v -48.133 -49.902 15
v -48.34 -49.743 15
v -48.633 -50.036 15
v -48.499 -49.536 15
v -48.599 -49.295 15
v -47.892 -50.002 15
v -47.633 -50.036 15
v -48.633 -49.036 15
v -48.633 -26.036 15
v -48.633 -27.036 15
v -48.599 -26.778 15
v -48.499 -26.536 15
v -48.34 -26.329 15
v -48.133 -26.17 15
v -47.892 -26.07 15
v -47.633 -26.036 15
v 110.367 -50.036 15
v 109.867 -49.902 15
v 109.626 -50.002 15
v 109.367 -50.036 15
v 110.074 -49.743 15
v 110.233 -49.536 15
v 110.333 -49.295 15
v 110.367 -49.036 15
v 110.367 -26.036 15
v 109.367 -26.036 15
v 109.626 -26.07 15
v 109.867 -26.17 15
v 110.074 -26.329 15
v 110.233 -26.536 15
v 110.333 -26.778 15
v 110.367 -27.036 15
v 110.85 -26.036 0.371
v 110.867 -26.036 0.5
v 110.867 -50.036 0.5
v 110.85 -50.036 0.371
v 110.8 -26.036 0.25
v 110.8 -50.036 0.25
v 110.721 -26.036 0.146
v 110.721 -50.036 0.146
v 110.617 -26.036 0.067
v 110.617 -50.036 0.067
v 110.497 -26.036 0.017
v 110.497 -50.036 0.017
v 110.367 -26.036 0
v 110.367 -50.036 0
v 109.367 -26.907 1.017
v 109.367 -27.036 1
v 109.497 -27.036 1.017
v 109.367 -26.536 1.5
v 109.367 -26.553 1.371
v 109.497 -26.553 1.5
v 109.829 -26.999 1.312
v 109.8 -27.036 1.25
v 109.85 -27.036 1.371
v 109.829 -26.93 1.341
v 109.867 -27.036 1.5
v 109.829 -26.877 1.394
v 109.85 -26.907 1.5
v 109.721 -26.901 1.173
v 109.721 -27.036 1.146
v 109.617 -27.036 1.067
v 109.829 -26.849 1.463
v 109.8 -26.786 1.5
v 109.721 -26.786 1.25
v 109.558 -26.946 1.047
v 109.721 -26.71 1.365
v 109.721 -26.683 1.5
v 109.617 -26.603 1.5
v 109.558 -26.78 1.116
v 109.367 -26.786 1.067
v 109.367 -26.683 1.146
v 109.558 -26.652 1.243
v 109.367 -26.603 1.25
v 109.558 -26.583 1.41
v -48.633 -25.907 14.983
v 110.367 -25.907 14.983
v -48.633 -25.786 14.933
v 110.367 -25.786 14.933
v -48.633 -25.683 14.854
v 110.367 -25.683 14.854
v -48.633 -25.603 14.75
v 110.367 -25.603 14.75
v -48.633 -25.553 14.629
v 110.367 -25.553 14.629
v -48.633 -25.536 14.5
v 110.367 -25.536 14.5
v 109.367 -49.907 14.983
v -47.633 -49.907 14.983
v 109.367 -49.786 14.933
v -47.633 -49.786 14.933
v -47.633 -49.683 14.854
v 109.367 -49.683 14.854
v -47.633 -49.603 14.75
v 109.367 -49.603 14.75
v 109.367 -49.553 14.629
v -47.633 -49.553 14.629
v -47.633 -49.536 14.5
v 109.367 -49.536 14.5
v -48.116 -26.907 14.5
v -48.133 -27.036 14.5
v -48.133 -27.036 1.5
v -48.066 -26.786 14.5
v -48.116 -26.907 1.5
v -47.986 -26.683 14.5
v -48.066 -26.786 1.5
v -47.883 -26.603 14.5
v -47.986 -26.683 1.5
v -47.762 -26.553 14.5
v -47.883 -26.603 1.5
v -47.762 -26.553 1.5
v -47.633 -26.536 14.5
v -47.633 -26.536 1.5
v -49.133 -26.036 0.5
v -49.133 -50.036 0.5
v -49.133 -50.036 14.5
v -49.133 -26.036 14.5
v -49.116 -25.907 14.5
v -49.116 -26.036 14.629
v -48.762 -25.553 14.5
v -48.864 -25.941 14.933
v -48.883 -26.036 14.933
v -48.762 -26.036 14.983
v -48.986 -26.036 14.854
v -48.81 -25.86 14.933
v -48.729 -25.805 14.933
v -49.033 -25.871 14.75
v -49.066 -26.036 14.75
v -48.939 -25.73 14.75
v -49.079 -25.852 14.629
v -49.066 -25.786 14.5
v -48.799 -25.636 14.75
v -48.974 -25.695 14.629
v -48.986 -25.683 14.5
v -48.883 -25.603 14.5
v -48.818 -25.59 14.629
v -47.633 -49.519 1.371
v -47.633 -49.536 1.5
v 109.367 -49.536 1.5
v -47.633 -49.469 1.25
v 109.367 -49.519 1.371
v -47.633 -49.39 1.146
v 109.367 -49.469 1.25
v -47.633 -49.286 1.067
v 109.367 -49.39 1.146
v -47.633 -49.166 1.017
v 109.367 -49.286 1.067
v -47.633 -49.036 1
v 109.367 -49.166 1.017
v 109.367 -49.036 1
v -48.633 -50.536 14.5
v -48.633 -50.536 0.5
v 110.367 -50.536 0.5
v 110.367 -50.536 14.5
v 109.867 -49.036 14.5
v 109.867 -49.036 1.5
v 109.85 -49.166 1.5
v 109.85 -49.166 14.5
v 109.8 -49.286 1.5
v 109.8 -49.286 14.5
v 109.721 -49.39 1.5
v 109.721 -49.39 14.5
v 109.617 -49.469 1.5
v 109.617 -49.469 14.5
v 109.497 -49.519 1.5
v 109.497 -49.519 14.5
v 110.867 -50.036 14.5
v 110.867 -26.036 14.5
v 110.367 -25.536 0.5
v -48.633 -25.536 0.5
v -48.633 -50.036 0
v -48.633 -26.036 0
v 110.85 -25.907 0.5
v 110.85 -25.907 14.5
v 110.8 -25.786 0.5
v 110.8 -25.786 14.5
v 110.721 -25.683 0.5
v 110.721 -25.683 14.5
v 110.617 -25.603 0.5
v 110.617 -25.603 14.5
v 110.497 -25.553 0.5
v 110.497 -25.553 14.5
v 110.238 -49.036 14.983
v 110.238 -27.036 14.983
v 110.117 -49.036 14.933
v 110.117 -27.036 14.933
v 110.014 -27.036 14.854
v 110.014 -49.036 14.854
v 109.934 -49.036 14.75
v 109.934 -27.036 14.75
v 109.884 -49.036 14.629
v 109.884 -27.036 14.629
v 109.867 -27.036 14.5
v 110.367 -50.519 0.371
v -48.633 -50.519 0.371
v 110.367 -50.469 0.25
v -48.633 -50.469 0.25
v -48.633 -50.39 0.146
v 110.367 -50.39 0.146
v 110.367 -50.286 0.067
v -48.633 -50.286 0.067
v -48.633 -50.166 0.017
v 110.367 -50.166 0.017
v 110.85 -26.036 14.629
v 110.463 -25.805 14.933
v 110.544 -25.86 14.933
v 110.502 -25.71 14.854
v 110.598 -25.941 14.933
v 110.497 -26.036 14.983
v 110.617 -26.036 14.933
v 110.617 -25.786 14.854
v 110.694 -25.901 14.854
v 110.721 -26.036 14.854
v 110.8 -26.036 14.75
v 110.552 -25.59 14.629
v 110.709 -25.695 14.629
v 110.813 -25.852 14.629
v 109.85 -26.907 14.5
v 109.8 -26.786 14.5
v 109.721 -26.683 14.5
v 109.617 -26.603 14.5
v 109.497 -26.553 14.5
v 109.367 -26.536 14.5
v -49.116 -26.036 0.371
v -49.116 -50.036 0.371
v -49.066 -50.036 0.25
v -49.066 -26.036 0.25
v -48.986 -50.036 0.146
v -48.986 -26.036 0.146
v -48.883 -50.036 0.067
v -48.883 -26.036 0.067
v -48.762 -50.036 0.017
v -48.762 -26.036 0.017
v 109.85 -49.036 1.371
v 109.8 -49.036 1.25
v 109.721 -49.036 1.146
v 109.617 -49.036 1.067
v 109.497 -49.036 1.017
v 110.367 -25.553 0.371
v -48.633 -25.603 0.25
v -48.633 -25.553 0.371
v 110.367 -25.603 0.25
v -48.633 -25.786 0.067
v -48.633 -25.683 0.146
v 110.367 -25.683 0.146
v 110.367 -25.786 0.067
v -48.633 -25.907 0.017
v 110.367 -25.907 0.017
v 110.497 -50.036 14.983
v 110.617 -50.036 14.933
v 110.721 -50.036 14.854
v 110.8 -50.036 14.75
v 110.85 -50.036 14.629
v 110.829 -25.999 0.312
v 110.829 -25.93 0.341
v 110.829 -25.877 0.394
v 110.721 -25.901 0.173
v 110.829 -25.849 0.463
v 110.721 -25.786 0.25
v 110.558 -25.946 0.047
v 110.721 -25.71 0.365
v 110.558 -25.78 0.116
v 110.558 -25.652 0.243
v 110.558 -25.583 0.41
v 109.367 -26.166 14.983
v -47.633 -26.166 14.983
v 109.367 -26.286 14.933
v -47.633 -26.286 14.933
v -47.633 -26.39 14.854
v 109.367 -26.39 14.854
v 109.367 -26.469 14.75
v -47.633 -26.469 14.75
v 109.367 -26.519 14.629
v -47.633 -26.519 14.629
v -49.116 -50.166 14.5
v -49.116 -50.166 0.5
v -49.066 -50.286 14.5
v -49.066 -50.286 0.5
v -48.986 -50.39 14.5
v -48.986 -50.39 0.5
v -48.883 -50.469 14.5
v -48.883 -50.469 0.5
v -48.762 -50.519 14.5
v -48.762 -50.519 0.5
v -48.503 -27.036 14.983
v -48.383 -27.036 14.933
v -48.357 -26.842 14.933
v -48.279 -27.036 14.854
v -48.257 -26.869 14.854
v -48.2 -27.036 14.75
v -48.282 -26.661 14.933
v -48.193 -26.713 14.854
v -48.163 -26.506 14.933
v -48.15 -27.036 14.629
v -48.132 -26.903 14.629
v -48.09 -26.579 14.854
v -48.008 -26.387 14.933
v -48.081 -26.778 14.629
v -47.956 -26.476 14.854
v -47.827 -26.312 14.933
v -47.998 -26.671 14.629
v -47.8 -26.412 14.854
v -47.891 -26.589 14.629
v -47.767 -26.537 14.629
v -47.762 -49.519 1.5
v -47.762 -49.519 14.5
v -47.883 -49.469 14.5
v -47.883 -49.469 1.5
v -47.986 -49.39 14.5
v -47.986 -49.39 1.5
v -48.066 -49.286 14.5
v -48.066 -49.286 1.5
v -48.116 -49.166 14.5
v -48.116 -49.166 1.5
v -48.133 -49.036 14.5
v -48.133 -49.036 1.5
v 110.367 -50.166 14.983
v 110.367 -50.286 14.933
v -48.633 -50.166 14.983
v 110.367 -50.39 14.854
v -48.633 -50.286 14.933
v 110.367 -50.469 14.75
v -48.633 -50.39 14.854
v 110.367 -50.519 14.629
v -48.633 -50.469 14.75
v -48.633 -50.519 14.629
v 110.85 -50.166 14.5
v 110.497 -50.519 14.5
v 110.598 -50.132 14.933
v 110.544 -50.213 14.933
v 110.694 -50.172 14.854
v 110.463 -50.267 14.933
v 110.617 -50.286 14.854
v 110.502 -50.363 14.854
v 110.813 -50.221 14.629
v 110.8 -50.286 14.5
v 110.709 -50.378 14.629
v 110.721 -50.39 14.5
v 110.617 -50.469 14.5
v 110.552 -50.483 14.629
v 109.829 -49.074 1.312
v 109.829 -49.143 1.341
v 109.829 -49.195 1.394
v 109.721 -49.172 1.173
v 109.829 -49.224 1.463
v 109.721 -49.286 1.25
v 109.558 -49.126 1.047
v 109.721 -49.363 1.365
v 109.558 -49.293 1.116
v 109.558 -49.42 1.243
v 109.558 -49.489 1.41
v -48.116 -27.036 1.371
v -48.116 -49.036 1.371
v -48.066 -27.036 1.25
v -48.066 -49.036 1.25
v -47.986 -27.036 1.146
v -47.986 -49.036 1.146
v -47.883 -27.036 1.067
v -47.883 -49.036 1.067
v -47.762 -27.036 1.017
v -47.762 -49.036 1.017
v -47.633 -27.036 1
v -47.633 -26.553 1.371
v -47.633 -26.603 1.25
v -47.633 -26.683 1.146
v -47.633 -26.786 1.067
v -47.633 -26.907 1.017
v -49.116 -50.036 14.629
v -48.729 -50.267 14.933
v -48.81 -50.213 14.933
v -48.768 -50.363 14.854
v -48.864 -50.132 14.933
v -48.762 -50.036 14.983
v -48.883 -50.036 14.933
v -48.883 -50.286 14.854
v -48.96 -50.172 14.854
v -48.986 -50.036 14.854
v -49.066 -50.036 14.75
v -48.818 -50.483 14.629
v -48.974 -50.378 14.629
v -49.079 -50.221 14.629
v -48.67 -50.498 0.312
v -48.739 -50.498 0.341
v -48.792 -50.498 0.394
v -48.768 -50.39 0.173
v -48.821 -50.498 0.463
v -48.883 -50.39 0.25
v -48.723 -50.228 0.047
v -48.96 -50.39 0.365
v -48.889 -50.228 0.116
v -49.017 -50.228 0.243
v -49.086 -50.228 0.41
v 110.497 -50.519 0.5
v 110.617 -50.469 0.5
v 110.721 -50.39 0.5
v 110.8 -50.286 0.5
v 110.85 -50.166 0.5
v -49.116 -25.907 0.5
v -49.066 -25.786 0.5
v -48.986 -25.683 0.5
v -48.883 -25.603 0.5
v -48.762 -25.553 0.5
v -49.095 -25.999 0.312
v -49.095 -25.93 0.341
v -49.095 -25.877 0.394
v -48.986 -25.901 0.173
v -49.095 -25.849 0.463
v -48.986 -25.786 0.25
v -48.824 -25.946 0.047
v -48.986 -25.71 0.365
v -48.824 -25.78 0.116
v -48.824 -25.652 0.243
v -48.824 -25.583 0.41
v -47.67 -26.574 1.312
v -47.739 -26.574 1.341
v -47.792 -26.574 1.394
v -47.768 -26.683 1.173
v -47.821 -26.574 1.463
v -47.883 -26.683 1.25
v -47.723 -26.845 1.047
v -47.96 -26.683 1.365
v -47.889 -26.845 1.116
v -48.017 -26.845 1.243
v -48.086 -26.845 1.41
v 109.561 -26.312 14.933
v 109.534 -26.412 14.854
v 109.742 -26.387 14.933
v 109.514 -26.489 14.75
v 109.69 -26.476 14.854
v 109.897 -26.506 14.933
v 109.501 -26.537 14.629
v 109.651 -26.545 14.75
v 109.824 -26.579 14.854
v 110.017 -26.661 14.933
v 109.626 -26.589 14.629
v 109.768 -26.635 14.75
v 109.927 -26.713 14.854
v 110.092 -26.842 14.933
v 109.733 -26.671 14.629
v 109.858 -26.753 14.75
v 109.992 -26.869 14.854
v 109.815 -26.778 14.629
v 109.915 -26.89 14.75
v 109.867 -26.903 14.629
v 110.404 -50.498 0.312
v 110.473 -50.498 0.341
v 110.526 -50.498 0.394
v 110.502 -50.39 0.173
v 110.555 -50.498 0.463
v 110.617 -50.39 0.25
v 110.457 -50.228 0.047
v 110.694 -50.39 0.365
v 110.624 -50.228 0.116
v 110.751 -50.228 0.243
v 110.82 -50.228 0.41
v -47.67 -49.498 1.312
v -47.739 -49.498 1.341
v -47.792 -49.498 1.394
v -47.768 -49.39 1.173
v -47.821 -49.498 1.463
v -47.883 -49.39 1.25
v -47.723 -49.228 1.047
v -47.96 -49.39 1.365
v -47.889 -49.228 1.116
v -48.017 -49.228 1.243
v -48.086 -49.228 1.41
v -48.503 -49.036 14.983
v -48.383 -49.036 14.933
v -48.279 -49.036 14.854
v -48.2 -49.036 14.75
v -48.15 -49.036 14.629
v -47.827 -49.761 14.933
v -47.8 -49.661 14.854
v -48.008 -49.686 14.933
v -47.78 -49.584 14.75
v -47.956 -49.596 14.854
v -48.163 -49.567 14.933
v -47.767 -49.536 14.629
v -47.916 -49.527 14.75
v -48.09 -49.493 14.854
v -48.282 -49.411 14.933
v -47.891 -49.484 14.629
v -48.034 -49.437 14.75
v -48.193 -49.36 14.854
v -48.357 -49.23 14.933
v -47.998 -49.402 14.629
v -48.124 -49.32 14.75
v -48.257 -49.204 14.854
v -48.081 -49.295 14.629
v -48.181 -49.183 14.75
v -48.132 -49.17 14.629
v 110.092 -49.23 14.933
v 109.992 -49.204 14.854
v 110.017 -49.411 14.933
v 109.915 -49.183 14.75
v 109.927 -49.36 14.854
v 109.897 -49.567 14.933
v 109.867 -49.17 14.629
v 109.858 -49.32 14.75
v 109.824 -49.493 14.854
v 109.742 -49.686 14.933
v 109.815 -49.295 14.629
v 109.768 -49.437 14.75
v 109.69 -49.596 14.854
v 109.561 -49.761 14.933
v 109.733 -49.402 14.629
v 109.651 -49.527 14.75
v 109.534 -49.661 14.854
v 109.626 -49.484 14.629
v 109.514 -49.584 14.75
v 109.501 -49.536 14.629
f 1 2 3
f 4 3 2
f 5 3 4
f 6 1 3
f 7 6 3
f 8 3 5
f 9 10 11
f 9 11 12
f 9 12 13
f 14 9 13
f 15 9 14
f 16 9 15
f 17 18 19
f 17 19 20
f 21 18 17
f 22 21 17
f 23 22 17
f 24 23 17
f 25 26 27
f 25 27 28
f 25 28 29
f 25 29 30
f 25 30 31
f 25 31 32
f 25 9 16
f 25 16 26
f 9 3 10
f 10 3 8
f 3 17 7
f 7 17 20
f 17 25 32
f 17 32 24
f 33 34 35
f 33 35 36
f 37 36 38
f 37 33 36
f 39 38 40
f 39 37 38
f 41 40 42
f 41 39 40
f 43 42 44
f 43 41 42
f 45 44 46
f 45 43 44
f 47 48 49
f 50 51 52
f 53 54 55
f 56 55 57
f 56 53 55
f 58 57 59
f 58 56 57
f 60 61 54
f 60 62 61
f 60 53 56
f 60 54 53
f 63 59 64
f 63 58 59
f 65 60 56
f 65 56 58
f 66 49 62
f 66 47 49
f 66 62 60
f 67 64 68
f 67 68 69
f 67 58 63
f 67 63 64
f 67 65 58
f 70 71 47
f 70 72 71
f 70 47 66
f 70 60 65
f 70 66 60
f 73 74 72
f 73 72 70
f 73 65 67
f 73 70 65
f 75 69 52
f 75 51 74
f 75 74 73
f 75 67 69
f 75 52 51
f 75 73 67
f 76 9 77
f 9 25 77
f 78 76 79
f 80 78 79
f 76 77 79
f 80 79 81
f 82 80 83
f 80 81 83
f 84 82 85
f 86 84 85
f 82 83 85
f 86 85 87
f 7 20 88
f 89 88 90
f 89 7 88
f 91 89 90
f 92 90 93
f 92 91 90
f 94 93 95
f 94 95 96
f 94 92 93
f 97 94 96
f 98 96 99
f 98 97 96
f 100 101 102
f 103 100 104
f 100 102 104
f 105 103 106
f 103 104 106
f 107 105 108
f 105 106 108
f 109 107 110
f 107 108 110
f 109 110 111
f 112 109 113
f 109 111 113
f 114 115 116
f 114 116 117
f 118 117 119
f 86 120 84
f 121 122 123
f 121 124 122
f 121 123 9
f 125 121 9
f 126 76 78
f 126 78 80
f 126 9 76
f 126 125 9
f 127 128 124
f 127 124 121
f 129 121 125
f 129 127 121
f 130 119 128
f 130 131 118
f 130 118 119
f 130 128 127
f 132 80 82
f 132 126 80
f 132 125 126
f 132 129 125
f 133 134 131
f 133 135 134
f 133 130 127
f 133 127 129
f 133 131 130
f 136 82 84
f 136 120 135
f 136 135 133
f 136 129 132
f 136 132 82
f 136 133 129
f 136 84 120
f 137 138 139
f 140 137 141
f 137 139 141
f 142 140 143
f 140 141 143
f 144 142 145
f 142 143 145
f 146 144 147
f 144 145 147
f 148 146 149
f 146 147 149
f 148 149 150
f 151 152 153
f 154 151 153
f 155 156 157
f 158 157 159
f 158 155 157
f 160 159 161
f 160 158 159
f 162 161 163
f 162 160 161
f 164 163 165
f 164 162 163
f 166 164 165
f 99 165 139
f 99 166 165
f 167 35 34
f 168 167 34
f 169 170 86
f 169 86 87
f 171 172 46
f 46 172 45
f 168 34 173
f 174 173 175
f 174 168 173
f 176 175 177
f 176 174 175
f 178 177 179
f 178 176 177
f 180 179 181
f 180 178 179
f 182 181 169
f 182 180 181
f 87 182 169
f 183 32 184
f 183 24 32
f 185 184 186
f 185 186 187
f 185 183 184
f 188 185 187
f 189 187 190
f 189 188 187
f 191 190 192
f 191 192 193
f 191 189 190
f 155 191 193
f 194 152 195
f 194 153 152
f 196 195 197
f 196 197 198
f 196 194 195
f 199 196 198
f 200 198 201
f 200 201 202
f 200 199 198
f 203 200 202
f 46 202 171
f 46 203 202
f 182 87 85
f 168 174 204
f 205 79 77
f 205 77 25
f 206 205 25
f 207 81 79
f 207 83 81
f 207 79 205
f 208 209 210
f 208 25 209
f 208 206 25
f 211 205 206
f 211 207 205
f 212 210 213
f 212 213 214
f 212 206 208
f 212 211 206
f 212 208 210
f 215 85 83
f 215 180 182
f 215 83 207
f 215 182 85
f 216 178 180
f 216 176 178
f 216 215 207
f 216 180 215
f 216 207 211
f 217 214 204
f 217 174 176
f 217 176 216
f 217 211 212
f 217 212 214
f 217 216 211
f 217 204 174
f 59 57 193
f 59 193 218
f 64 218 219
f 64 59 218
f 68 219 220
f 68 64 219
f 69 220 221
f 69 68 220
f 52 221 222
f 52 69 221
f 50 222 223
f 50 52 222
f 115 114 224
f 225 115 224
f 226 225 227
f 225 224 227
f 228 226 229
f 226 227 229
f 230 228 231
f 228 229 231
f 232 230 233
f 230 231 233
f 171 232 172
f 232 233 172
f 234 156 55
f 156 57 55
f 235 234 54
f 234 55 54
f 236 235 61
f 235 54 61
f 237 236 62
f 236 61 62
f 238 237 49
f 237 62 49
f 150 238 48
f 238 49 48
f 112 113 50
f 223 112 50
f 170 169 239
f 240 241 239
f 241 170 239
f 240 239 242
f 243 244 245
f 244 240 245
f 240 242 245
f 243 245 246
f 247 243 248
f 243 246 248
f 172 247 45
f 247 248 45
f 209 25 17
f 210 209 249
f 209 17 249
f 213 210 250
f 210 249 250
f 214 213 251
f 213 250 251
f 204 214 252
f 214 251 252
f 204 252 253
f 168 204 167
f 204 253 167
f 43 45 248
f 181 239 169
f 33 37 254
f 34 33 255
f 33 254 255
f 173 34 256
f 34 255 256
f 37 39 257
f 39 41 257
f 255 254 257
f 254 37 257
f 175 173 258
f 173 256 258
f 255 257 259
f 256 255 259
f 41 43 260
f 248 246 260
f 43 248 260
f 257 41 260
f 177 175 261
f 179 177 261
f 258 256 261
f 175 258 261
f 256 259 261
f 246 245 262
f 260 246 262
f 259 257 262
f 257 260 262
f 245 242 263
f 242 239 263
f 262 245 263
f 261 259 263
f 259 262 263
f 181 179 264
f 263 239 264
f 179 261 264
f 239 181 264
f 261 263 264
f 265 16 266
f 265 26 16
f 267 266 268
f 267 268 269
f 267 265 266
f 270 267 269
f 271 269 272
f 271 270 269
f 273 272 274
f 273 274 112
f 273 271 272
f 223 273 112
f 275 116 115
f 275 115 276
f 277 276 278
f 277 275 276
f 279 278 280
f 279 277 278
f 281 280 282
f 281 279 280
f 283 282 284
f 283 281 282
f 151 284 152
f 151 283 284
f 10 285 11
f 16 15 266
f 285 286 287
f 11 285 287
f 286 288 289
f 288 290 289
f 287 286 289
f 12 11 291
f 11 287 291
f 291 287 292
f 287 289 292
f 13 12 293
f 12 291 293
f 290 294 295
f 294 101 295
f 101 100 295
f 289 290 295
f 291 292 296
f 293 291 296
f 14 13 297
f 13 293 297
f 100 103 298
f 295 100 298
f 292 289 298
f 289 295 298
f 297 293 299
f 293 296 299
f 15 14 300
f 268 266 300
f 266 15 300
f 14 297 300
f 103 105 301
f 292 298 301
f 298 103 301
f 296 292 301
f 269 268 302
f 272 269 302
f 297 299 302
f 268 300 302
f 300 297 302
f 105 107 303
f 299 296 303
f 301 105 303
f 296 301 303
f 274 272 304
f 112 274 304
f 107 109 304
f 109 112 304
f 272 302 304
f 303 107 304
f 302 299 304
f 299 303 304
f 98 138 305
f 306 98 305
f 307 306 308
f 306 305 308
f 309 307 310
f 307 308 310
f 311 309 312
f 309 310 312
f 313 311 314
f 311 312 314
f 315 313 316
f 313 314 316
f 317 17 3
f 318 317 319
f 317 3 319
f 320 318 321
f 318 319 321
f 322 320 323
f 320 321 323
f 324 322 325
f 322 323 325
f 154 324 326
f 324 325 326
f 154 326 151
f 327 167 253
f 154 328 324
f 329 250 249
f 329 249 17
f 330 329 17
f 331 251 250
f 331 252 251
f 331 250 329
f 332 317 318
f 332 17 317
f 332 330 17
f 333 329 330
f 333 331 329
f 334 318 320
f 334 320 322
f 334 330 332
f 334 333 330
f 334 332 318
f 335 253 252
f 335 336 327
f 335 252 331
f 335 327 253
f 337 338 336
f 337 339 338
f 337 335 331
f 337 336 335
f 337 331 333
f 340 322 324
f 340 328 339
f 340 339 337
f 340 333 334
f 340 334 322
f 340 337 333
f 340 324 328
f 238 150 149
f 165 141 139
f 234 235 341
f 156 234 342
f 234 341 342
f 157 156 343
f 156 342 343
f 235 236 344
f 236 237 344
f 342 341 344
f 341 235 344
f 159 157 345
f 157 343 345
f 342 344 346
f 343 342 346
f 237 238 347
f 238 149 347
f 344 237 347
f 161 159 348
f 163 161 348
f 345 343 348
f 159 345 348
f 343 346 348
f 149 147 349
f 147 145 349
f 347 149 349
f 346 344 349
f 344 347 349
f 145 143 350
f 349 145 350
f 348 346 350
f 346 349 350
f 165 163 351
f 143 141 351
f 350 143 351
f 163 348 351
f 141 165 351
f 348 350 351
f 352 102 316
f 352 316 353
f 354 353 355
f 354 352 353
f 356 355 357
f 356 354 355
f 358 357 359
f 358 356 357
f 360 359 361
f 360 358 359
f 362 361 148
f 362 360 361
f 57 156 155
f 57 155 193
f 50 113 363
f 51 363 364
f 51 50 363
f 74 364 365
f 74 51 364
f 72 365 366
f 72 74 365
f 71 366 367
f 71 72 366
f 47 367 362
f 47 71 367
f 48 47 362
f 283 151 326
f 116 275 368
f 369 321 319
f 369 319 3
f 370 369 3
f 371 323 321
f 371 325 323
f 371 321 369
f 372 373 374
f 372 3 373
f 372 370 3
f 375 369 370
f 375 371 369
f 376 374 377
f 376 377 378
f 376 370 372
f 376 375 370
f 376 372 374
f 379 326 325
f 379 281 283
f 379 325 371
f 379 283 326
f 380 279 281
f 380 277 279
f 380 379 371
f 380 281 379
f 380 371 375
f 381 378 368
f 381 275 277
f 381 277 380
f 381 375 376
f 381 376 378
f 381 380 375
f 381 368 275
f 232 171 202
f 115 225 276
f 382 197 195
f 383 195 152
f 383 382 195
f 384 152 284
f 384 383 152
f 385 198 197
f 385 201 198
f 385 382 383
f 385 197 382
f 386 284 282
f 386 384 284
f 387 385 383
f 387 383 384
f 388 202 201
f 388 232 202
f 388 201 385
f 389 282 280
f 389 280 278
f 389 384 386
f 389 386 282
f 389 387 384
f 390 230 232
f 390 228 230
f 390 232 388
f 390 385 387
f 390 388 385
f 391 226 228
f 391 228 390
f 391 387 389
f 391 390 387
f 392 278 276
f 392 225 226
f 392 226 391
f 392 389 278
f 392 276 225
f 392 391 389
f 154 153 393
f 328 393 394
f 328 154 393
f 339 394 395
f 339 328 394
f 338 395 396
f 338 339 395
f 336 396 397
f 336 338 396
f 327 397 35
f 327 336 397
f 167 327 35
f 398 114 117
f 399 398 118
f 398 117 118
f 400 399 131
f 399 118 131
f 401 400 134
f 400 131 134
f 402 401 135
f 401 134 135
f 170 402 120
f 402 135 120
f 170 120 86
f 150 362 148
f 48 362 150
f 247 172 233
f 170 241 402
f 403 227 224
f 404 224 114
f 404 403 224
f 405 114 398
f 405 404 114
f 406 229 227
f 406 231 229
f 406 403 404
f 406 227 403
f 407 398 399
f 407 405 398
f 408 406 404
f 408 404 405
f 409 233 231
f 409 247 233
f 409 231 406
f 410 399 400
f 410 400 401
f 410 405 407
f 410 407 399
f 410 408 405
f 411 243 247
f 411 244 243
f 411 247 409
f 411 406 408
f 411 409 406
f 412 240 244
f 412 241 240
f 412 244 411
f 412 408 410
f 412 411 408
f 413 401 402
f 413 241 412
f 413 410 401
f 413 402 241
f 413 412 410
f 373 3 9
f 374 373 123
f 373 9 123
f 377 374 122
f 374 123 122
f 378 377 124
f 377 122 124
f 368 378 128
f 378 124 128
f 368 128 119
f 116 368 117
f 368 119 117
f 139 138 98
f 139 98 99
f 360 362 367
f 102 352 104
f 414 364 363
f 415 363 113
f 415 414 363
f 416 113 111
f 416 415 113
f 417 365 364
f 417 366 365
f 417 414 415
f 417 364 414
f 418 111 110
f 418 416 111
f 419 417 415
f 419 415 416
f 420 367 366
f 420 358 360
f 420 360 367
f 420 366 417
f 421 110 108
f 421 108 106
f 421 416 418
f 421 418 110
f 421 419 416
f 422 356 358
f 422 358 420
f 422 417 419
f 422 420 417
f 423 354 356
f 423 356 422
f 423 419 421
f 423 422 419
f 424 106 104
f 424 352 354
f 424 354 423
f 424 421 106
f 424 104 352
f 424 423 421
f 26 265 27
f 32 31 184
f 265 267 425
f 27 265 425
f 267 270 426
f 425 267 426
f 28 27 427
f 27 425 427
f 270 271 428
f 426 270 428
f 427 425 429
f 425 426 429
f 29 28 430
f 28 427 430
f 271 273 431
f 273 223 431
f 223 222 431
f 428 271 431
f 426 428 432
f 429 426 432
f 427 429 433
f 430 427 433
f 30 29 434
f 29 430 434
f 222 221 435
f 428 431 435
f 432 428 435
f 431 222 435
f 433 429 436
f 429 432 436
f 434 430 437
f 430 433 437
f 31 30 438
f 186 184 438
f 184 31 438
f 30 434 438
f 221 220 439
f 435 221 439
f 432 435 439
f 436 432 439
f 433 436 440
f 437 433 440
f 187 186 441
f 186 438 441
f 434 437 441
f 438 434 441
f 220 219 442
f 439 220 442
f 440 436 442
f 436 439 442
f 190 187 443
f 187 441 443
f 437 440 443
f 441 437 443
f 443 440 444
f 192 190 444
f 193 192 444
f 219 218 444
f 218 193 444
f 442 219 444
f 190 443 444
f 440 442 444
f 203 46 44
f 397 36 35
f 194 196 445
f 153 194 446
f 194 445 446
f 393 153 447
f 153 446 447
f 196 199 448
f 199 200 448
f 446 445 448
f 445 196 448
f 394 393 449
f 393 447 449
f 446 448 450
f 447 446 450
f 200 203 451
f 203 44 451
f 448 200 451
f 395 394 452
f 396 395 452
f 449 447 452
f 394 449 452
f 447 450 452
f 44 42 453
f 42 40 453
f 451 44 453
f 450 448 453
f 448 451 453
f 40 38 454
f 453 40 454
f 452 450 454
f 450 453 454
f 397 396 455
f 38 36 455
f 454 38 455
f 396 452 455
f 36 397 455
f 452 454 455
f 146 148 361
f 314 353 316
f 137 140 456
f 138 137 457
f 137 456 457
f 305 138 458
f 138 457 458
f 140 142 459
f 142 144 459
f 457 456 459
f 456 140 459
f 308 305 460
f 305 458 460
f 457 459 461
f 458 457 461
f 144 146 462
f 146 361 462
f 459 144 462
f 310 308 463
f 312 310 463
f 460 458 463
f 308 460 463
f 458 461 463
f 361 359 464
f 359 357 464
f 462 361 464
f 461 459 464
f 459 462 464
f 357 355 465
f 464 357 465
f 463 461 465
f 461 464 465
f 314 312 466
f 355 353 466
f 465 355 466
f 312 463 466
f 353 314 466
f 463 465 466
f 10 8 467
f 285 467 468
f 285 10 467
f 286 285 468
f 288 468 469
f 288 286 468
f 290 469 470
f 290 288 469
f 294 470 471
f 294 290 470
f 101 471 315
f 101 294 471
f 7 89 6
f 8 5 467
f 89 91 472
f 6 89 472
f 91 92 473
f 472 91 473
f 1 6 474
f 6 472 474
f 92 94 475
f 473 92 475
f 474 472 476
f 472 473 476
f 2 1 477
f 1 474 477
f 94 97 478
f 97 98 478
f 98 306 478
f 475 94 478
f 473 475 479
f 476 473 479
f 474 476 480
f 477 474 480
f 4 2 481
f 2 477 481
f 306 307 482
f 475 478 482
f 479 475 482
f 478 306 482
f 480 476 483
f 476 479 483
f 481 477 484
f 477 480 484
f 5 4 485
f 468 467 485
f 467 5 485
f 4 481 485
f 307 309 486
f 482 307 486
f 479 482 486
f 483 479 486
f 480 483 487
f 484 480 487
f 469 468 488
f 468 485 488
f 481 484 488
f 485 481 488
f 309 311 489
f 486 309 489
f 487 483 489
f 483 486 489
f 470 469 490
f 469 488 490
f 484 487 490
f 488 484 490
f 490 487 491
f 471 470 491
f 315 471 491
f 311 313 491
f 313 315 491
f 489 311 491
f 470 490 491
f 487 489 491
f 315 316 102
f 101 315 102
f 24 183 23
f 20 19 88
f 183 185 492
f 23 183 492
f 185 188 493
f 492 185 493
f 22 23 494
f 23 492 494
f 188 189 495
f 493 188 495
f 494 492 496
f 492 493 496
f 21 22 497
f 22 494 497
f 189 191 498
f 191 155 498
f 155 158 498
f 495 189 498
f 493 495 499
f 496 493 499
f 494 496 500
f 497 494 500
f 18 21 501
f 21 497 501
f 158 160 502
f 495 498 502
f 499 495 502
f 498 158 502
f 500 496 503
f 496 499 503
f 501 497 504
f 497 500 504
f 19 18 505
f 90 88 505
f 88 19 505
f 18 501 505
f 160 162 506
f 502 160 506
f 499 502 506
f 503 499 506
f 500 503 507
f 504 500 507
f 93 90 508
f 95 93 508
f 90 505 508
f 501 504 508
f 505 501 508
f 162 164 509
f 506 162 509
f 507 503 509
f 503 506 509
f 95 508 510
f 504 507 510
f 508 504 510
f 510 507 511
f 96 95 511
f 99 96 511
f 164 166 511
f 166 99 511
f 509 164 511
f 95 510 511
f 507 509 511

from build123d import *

# Parameters (mm, degrees)
F0_W     = 160
F0_H     = 25
F1_DEPTH = 15
F2_T     = -1
F3_R     = 0.5
F4_R     = 0.5
F5_R     = 0.49999


# Not quite as in the source:
# - a fillet or chamfer is up to 0.001 mm smaller than in the source, because OpenCascade refuses the exact size


with BuildPart() as f1:
    # F0 (on Top) → F1 (new body)
    with BuildSketch(Plane.XY):
        with Locations((30.8671402, -38.0363363773)):
            Rectangle(F0_W, F0_H)
    extrude(amount=F1_DEPTH)

    # F2
    f2_openings = [f1.faces().sort_by_distance(p)[0] for p in [
        (30.86714, -38.036336, 15),
    ]]
    offset(amount=F2_T, openings=f2_openings)

    # F3
    f3_edges = [f1.edges().sort_by_distance(p)[0] for p in [
        (30.86714, -25.536336, 0),
        (110.86714, -38.036336, 0),
        (-49.13286, -38.036336, 0),
        (30.86714, -50.536336, 0),
        (110.86714, -25.536336, 7.5),
        (-49.13286, -25.536336, 7.5),
        (-49.13286, -50.536336, 7.5),
        (110.86714, -50.536336, 7.5),
    ]]
    fillet(f3_edges, radius=F3_R)

    # F4
    f4_edges = [f1.edges().sort_by_distance(p)[0] for p in [
        (-48.13286, -38.036336, 1),
        (30.86714, -26.536336, 1),
        (30.86714, -49.536336, 1),
        (109.86714, -38.036336, 1),
        (-48.13286, -26.536336, 8),
        (-48.13286, -49.536336, 8),
        (109.86714, -26.536336, 8),
        (109.86714, -49.536336, 8),
    ]]
    fillet(f4_edges, radius=F4_R)

    # F5 (radius 0.5 in the source; OpenCascade refuses exactly that, so slightly less here)
    f5_edges = [f1.edges().sort_by_distance(p)[0] for p in [
        (30.86714, -25.536336, 15),
        (30.86714, -26.536336, 15),
        (30.86714, -49.536336, 15),
        (30.86714, -50.536336, 15),
        (109.86714, -38.036336, 15),
        (110.86714, -38.036336, 15),
        (-49.13286, -38.036336, 15),
        (-48.13286, -38.036336, 15),
        (-47.986413, -49.38989, 15),
        (-47.986413, -26.682783, 15),
        (-48.986413, -25.682783, 15),
        (-48.986413, -50.38989, 15),
        (109.720694, -26.682783, 15),
        (110.720694, -25.682783, 15),
        (109.720694, -49.38989, 15),
        (110.720694, -50.38989, 15),
    ]]
    fillet(f5_edges, radius=F5_R)


solid = f1.part
